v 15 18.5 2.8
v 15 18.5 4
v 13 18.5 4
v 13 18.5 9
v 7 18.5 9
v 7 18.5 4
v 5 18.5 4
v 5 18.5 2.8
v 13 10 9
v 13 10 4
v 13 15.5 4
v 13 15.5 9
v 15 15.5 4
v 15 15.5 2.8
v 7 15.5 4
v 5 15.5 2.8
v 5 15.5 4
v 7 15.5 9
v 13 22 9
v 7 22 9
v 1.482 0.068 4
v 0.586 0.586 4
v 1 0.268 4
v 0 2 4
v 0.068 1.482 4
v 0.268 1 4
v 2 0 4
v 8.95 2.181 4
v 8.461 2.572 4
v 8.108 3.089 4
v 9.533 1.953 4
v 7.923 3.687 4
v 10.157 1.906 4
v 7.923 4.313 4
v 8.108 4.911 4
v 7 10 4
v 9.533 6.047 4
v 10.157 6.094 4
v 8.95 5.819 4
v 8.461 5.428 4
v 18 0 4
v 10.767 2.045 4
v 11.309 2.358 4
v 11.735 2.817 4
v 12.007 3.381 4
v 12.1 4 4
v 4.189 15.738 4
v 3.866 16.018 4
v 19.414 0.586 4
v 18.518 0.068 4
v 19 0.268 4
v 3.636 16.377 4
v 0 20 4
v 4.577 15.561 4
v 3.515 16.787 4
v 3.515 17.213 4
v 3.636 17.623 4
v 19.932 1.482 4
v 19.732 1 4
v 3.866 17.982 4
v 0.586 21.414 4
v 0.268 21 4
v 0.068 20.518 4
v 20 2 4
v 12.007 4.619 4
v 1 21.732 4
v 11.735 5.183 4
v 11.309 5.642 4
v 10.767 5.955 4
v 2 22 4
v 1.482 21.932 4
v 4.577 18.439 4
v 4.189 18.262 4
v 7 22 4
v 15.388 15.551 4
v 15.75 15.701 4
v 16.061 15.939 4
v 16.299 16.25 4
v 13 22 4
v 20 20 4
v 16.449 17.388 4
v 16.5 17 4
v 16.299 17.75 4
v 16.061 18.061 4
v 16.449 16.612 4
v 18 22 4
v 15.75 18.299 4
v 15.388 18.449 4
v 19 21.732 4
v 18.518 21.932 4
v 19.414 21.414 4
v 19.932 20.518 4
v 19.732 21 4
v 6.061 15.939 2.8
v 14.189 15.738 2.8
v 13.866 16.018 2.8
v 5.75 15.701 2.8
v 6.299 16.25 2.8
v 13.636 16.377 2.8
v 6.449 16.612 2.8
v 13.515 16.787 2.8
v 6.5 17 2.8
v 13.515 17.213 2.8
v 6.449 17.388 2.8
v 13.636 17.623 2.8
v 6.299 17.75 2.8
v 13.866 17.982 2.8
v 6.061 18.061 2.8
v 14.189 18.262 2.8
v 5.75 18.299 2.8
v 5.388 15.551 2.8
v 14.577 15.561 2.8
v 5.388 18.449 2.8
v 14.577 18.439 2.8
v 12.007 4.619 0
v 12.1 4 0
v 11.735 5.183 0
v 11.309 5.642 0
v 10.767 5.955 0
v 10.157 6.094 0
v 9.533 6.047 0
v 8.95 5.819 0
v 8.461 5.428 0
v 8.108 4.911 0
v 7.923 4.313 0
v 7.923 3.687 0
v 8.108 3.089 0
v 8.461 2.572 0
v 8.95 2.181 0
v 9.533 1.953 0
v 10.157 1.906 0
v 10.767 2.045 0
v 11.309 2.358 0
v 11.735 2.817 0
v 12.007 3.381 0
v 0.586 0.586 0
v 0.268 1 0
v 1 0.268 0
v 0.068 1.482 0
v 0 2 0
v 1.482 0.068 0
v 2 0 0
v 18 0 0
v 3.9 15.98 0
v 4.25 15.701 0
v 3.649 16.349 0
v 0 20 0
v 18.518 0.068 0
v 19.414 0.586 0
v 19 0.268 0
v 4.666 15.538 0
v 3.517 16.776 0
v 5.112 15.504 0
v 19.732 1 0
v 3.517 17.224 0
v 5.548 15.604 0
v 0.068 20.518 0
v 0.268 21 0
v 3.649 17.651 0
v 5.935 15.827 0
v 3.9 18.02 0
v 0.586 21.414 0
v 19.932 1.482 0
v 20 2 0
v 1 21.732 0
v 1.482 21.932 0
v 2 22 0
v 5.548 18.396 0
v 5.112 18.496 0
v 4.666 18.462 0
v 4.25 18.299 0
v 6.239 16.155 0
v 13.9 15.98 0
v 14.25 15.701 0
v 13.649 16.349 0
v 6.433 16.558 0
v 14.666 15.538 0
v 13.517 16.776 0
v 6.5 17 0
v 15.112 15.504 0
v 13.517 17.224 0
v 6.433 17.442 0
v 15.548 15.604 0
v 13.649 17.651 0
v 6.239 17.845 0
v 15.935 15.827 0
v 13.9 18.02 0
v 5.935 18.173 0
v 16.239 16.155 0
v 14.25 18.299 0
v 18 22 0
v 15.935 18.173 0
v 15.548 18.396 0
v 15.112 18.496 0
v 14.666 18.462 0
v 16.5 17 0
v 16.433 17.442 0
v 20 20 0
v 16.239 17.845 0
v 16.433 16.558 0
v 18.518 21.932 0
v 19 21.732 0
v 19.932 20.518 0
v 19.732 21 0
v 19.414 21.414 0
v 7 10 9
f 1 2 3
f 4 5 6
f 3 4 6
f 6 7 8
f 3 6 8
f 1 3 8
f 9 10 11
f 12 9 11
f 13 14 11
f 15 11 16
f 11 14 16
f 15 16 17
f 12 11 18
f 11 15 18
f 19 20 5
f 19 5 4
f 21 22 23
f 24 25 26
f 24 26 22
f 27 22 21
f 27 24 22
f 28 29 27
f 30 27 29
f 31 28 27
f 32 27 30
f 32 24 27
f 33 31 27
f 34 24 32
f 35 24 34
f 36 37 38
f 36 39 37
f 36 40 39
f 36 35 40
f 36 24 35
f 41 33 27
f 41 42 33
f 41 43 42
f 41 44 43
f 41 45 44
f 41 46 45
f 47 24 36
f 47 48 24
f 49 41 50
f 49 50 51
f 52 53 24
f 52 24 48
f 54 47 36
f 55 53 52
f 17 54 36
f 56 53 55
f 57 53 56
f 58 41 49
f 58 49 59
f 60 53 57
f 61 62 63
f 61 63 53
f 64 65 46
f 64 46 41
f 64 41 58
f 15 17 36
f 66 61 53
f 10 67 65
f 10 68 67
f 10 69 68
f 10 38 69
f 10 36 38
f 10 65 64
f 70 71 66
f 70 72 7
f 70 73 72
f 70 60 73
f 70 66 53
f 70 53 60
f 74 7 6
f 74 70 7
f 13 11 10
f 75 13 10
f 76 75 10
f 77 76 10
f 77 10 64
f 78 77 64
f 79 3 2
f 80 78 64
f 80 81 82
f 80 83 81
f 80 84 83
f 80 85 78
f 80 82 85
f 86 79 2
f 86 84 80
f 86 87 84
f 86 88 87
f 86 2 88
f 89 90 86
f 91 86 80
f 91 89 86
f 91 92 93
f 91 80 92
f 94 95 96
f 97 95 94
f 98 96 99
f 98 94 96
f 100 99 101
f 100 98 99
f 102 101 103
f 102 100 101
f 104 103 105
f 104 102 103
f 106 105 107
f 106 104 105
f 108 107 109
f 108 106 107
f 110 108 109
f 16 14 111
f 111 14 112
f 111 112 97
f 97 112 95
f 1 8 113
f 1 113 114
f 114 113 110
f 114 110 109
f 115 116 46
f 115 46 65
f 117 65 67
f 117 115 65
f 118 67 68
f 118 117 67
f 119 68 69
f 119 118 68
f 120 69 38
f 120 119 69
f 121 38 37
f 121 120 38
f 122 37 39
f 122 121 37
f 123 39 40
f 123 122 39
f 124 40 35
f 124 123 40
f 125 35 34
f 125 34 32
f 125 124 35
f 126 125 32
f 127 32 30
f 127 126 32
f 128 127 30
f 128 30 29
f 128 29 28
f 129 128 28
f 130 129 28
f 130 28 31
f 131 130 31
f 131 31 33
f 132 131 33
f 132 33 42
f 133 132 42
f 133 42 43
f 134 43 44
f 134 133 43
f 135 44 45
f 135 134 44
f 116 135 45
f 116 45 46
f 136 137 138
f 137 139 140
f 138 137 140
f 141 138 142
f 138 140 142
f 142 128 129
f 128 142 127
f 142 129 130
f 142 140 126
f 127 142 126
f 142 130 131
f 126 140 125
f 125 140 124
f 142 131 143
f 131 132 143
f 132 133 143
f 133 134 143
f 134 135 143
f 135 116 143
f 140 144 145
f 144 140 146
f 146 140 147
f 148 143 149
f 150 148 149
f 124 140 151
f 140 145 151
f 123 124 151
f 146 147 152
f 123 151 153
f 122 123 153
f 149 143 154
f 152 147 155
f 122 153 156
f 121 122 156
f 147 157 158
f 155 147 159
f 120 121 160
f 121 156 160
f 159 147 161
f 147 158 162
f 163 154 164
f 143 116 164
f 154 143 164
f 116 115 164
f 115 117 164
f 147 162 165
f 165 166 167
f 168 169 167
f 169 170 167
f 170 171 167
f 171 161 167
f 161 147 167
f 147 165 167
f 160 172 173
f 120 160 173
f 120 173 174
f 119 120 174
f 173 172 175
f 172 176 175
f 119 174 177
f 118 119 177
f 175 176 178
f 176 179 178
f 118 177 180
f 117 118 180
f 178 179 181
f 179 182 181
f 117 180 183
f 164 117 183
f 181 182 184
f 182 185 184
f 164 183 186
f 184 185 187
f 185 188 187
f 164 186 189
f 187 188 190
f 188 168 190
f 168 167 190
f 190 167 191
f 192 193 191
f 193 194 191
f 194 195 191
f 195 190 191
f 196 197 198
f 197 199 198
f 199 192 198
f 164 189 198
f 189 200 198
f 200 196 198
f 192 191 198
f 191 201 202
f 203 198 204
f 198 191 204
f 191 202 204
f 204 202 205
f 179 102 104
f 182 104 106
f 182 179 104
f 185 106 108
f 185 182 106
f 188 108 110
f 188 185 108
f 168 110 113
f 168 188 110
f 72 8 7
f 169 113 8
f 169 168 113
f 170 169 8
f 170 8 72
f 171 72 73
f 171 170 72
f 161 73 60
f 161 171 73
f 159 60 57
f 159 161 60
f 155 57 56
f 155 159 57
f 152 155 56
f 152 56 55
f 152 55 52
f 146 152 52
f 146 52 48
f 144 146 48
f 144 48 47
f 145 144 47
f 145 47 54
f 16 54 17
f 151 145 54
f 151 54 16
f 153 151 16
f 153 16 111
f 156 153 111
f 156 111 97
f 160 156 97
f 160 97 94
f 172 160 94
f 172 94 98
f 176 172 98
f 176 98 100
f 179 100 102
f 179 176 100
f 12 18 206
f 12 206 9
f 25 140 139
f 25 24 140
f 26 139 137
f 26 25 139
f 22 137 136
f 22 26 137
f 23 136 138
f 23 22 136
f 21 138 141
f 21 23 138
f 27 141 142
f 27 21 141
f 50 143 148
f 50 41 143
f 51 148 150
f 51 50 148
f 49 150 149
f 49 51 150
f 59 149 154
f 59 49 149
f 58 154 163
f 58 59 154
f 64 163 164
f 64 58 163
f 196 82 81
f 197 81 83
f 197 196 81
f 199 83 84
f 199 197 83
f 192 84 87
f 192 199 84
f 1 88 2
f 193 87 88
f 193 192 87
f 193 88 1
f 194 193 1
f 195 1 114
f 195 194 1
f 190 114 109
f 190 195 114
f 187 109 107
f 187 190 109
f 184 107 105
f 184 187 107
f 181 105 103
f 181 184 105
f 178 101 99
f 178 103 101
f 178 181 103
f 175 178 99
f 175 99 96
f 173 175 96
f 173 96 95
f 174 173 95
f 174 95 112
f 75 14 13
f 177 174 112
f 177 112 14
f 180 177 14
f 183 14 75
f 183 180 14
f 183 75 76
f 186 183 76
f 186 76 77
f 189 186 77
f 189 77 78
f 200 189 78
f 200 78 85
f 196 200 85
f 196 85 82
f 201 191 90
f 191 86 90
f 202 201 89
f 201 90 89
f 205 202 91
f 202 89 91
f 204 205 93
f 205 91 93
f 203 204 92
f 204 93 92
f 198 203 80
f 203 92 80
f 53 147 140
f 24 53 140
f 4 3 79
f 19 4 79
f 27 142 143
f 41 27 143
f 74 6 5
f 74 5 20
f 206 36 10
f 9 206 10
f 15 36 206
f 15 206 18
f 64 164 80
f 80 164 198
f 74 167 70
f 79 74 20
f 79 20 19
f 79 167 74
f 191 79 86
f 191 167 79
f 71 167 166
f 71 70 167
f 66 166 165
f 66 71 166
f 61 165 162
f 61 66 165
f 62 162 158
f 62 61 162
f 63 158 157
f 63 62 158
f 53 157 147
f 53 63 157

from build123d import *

# Parameters (mm, degrees)
SKETCH_1_R          = 2.1
SKETCH_1_R_2        = 1.5
EXTRUDE_1_DEPTH     = 4
SKETCH_1_3_W        = 6
SKETCH_1_3_H        = 12
EXTRUDE_2_DEPTH     = 9
FILLET_1_R          = 2
CUT_EXTRUDE_START   = -5
CUT_EXTRUDE_1_DEPTH = 10


with BuildPart() as part:
    # 草图1 → 凸台-拉伸1 (new body)
    with BuildSketch(Plane.XY):
        Polygon((0, 22), (0, 0), (20, 0), (20, 22), (13, 22), (13, 10), (7, 10), (7, 22), align=None)
        with Locations((10, 4)):
            Circle(SKETCH_1_R, mode=Mode.SUBTRACT)
        with Locations((5, 17)):
            Circle(SKETCH_1_R_2, mode=Mode.SUBTRACT)
        with Locations((15, 17)):
            Circle(SKETCH_1_R_2, mode=Mode.SUBTRACT)
    extrude(amount=EXTRUDE_1_DEPTH)

    # 草图1<3> → 凸台-拉伸2 (add)
    with BuildSketch(Plane.XY):
        with Locations((10, 16)):
            Rectangle(SKETCH_1_3_W, SKETCH_1_3_H)
    extrude(amount=EXTRUDE_2_DEPTH)

    # 圆角1
    fillet_1_edges = [part.edges().sort_by_distance(p)[0] for p in [
        (20, 22, 2),
        (20, 0, 2),
        (0, 0, 2),
        (0, 22, 2),
    ]]
    fillet(fillet_1_edges, radius=FILLET_1_R)

    # 草图2 → 切除-拉伸1 (cut)
    with BuildSketch(Plane.ZY.offset(CUT_EXTRUDE_START)):
        Polygon((2.8, 18.5), (4, 18.5), (14, 18.5), (14, 15.5), (4, 15.5), (2.8, 15.5), align=None)
    extrude(amount=-CUT_EXTRUDE_1_DEPTH, mode=Mode.SUBTRACT)


solid = part.part
